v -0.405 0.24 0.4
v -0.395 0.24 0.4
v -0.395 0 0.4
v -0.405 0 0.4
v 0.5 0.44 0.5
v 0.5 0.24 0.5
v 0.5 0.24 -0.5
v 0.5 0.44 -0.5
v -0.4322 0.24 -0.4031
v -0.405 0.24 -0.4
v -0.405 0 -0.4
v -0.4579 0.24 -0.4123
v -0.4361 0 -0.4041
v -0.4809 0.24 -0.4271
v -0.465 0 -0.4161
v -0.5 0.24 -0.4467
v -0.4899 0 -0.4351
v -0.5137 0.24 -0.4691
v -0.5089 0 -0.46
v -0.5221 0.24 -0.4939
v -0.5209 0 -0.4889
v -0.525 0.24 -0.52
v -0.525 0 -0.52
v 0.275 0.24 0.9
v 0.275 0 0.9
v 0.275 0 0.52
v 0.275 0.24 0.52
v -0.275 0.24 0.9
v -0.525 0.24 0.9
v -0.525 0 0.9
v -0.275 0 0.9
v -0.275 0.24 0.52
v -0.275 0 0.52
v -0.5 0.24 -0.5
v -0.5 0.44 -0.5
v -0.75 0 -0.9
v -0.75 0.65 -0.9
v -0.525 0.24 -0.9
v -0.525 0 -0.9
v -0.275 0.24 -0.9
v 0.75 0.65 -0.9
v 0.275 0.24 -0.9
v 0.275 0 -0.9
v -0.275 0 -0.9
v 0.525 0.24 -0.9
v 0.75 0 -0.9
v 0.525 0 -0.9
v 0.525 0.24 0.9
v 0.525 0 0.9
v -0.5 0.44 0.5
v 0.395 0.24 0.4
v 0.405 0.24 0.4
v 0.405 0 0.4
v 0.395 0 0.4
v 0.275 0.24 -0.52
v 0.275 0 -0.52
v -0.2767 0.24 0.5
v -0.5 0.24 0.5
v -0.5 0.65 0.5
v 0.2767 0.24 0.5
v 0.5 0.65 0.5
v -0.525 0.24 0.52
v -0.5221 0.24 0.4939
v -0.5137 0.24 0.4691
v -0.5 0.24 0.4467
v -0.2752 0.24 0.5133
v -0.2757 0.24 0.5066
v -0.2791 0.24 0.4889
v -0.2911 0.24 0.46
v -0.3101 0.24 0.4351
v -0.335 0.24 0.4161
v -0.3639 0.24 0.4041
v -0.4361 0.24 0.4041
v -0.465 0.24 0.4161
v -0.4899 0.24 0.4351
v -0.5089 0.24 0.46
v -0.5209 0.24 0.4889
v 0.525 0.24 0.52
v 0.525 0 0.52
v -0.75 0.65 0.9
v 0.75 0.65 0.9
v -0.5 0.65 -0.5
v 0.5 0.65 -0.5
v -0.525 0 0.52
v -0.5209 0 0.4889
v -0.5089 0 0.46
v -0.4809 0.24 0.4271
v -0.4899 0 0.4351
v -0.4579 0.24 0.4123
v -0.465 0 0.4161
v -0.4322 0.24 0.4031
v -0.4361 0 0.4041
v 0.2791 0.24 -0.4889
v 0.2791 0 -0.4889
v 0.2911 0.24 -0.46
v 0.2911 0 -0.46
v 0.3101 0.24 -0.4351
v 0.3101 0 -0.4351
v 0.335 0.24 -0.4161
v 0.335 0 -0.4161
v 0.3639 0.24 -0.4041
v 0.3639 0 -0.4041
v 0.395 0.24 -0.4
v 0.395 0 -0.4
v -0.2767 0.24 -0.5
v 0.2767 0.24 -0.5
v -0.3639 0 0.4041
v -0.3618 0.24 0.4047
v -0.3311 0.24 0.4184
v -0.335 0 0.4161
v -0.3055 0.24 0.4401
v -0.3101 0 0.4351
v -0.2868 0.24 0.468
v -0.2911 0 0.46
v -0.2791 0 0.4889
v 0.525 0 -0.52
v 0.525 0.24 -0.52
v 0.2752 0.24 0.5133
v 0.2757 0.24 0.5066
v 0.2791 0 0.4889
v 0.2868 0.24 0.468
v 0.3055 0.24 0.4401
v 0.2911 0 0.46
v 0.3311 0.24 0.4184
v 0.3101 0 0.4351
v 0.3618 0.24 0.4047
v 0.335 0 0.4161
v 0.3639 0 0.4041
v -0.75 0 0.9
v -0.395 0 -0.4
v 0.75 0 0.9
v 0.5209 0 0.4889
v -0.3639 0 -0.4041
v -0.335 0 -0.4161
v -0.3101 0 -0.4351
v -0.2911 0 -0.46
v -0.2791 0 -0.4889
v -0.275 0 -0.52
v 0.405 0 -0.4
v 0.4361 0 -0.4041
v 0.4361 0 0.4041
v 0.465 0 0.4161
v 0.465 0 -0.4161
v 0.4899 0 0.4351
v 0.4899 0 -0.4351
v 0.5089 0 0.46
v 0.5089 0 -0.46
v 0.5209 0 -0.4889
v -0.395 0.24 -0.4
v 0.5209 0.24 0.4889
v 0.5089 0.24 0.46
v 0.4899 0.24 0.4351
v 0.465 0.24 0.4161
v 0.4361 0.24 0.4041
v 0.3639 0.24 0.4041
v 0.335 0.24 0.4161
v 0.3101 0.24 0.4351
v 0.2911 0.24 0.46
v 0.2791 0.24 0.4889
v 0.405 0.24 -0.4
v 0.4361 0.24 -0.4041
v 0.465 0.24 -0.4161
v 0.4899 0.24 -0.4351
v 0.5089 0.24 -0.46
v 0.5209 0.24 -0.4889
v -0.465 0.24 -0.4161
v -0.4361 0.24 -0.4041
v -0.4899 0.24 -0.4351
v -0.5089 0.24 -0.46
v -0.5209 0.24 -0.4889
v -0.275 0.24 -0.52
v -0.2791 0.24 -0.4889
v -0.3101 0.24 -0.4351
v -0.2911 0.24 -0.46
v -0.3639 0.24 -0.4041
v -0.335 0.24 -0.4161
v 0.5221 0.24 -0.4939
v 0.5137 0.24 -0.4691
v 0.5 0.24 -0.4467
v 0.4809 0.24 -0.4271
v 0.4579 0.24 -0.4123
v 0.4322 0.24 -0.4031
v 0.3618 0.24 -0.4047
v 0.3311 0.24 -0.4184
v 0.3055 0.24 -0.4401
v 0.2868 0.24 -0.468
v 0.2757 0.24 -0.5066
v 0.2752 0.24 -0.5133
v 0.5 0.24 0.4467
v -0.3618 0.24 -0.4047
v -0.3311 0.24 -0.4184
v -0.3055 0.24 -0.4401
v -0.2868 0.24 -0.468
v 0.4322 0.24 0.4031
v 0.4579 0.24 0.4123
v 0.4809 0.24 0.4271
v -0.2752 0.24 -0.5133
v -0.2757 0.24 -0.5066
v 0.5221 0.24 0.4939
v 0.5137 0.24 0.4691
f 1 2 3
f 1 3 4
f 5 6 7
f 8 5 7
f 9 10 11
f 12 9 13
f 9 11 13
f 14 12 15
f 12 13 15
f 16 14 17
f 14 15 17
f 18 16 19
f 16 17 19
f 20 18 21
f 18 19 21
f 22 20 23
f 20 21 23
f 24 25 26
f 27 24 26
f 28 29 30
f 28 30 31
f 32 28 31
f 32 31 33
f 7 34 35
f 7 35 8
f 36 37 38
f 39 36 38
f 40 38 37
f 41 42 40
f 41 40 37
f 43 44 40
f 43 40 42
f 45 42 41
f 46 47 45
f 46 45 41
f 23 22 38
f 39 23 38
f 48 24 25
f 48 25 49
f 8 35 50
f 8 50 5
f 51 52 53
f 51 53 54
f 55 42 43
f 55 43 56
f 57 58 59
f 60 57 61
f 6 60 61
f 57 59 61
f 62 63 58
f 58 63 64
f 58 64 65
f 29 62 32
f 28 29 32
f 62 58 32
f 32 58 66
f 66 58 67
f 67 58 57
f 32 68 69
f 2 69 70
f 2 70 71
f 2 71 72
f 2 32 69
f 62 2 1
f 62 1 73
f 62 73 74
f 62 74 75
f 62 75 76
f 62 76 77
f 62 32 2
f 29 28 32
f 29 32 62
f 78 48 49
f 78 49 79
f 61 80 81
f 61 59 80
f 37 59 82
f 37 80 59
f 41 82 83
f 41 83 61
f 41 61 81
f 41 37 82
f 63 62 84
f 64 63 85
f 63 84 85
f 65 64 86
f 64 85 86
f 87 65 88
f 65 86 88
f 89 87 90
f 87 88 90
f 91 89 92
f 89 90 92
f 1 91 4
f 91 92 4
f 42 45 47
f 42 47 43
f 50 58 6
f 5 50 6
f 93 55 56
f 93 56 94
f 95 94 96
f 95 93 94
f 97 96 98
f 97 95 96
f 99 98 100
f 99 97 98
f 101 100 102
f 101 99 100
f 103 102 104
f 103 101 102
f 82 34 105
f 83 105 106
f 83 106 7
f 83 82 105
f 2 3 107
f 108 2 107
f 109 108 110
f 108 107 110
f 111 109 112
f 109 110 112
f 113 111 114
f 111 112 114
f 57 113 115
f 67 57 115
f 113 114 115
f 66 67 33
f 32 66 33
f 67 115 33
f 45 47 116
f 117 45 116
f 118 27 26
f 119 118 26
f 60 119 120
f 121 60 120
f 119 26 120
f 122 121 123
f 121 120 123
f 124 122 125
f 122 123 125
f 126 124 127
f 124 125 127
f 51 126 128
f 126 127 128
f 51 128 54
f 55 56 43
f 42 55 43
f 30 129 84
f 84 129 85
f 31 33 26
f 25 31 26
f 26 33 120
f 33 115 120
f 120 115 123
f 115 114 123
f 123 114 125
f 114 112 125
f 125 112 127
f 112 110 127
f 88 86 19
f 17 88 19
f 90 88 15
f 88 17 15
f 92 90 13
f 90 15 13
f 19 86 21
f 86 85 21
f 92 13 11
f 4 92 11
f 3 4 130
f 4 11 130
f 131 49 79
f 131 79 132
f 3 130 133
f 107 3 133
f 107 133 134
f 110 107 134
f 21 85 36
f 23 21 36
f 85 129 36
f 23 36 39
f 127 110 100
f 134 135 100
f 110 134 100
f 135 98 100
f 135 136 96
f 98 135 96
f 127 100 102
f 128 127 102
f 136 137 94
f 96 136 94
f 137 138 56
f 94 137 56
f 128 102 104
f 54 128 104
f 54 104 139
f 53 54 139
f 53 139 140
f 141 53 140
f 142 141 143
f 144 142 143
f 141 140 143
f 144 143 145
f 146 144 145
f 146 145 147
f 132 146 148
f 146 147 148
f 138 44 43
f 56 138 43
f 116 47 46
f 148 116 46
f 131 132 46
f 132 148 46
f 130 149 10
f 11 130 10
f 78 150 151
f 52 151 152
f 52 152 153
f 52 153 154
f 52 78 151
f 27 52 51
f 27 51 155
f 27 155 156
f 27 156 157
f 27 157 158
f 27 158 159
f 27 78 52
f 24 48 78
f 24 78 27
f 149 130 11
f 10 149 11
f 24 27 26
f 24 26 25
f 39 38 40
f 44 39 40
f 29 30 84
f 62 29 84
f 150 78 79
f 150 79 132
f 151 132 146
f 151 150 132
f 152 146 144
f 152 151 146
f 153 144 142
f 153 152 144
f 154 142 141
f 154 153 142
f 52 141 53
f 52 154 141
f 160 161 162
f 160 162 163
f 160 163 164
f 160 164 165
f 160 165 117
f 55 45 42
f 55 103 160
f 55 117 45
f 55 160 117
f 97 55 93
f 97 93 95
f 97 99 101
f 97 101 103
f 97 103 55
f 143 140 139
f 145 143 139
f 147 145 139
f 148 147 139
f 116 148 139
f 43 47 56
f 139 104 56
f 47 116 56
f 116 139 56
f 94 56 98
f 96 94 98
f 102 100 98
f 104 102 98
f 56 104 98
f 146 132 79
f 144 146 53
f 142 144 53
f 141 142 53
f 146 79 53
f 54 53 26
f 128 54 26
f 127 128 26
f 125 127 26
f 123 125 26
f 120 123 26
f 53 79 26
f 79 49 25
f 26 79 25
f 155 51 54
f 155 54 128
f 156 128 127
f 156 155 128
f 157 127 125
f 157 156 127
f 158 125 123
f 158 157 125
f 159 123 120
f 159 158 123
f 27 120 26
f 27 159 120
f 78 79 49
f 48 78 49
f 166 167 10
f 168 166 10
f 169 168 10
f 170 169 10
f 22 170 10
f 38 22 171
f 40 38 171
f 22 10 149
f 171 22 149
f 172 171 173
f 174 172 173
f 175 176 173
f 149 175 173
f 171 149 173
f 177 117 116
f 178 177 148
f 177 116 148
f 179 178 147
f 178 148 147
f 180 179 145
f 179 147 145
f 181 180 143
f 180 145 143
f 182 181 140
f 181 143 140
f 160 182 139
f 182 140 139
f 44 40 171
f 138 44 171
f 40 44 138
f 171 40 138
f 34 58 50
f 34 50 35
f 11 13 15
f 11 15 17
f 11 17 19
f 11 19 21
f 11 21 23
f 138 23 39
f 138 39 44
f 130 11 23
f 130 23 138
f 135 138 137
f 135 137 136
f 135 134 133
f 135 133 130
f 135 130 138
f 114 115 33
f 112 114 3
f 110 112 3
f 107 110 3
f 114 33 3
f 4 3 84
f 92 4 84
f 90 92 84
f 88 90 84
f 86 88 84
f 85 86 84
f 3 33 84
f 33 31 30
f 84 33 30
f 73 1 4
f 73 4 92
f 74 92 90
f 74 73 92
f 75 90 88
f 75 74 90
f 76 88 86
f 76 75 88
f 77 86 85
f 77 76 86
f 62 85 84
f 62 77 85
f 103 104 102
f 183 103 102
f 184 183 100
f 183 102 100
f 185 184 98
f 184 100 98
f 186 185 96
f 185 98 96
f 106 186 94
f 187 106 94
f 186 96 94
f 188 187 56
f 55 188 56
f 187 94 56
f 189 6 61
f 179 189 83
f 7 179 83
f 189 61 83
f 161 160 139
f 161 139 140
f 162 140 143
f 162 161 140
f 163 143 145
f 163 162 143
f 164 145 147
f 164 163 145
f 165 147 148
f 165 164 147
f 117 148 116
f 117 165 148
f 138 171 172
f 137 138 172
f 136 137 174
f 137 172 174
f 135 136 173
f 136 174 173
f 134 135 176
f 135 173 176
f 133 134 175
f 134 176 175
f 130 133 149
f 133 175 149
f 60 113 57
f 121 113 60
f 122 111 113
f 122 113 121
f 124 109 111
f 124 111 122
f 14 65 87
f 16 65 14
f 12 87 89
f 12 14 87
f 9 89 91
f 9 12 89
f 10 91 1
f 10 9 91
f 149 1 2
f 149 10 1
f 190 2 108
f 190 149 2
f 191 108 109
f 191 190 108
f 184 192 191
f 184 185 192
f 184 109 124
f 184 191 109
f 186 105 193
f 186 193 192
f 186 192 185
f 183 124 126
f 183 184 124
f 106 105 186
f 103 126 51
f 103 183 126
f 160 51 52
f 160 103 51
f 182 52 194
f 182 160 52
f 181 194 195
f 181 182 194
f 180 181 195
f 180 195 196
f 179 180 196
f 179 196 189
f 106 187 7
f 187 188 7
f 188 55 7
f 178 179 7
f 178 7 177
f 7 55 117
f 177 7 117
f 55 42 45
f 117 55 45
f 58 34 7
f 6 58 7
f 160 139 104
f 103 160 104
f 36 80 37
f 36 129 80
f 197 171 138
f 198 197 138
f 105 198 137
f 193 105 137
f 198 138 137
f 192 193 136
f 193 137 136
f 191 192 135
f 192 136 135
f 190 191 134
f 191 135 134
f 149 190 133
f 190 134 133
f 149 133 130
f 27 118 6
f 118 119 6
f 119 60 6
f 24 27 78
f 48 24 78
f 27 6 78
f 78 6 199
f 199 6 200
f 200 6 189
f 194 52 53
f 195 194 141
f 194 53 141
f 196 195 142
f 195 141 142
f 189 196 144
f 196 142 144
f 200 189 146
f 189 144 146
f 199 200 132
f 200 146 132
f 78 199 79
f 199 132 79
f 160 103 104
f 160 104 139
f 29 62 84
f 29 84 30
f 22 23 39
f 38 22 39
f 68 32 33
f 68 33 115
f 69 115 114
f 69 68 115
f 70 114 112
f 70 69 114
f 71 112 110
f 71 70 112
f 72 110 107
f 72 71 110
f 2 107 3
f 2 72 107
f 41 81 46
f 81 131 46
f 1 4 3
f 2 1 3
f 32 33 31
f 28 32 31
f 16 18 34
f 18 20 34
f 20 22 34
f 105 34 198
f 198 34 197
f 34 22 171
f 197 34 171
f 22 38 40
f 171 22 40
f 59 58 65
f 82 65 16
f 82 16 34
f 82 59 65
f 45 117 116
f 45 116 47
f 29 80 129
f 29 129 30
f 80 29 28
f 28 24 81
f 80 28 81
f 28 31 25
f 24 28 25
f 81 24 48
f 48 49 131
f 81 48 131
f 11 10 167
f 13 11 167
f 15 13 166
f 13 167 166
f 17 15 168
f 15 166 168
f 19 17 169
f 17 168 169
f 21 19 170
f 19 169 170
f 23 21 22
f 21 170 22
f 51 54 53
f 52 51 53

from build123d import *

# Parameters (mm, degrees)
BOSS_EXTRUDE1_DEPTH   = 0.24
SKETCH2_W             = 1
SKETCH2_H             = 1
BOSS_EXTRUDE2_DEPTH   = 0.2
SKETCH3_W             = 1.5
SKETCH3_H             = 1.8
SKETCH3_W_2           = 1
SKETCH3_H_2           = 1
BOSS_EXTRUDE3_DEPTH   = 0.2
SKETCH4_W             = 1.5
SKETCH4_H             = 1.8
BOSS_EXTRUDE4_DEPTH   = 0.21
BOSS_EXTRUDE5_DEPTH   = 0.24
BOSS_EXTRUDE5_2_DEPTH = 0.24
BOSS_EXTRUDE5_3_DEPTH = 0.24
BOSS_EXTRUDE5_4_DEPTH = 0.24
SKETCH6_W             = 1
SKETCH6_H             = 1
CUT_EXTRUDE4_DEPTH    = 0.21


with BuildPart() as part:
    # Sketch1 → Boss-Extrude1 (new body)
    with BuildSketch(Plane(origin=(0, 0, 0), x_dir=(1, 0, 0), z_dir=(0, 1, 0))):
        with BuildLine():
            Line((0.75, 0.9), (0.525, 0.9))
            Line((0.525, 0.9), (0.525, 0.52))
            ThreePointArc((0.525, 0.52), (0.489852814, 0.435147186), (0.405, 0.4))
            Line((0.405, 0.4), (0.395, 0.4))
            ThreePointArc((0.395, 0.4), (0.310147186, 0.435147186), (0.275, 0.52))
            Line((0.275, 0.52), (0.275, 0.9))
            Line((0.275, 0.9), (-0.275, 0.9))
            Line((-0.275, 0.9), (-0.275, 0.52))
            ThreePointArc((-0.275, 0.52), (-0.310147186, 0.435147186), (-0.395, 0.4))
            Line((-0.395, 0.4), (-0.405, 0.4))
            ThreePointArc((-0.405, 0.4), (-0.489852814, 0.435147186), (-0.525, 0.52))
            Line((-0.525, 0.52), (-0.525, 0.9))
            Line((-0.525, 0.9), (-0.75, 0.9))
            Line((-0.75, 0.9), (-0.75, -0.9))
            Line((-0.75, -0.9), (-0.525, -0.9))
            Line((-0.525, -0.9), (-0.525, -0.52))
            ThreePointArc((-0.525, -0.52), (-0.489852814, -0.435147186), (-0.405, -0.4))
            Line((-0.405, -0.4), (-0.395, -0.4))
            ThreePointArc((-0.395, -0.4), (-0.310147186, -0.435147186), (-0.275, -0.52))
            Line((-0.275, -0.52), (-0.275, -0.9))
            Line((-0.275, -0.9), (0.275, -0.9))
            Line((0.275, -0.9), (0.275, -0.52))
            ThreePointArc((0.275, -0.52), (0.310147186, -0.435147186), (0.395, -0.4))
            Line((0.395, -0.4), (0.405, -0.4))
            ThreePointArc((0.405, -0.4), (0.489852814, -0.435147186), (0.525, -0.52))
            Line((0.525, -0.52), (0.525, -0.9))
            Line((0.525, -0.9), (0.75, -0.9))
            Line((0.75, -0.9), (0.75, 0.9))
        make_face()
    extrude(amount=BOSS_EXTRUDE1_DEPTH)

    # Sketch3 → Boss-Extrude3 (add)
    with BuildSketch(Plane(origin=(0, 0.24, 0), x_dir=(1, 0, 0), z_dir=(0, 1, 0))):
        Rectangle(SKETCH3_W, SKETCH3_H)
        Rectangle(SKETCH3_W_2, SKETCH3_H_2, mode=Mode.SUBTRACT)
    extrude(amount=BOSS_EXTRUDE3_DEPTH)

    # Sketch4 → Boss-Extrude4 (add)
    with BuildSketch(Plane(origin=(0, 0.44, 0), x_dir=(1, 0, 0), z_dir=(0, 1, 0))):
        Rectangle(SKETCH4_W, SKETCH4_H)
    extrude(amount=BOSS_EXTRUDE4_DEPTH)

    # Sketch6 → Cut-Extrude4 (cut)
    with BuildSketch(Plane(origin=(0, 0.65, 0), x_dir=(1, 0, 0), z_dir=(0, 1, 0))):
        Rectangle(SKETCH6_W, SKETCH6_H)
    extrude(amount=-CUT_EXTRUDE4_DEPTH, mode=Mode.SUBTRACT)


with BuildPart() as body_2:
    # Sketch2 → Boss-Extrude2 (new body)
    with BuildSketch(Plane(origin=(0, 0.24, 0), x_dir=(1, 0, 0), z_dir=(0, 1, 0))):
        Rectangle(SKETCH2_W, SKETCH2_H)
    extrude(amount=BOSS_EXTRUDE2_DEPTH)


with BuildPart() as body_3:
    # Sketch5 → Boss-Extrude5 (new body)
    with BuildSketch(Plane.XZ.offset(-0.24)):
        with BuildLine():
            Line((0.525, -0.9), (0.275, -0.9))
            Line((0.275, -0.9), (0.275, -0.52))
            ThreePointArc((0.275, -0.52), (0.310147186, -0.435147186), (0.395, -0.4))
            Line((0.395, -0.4), (0.405, -0.4))
            ThreePointArc((0.405, -0.4), (0.489852814, -0.435147186), (0.525, -0.52))
            Line((0.525, -0.52), (0.525, -0.9))
        make_face()
    extrude(amount=BOSS_EXTRUDE5_DEPTH)


with BuildPart() as body_4:
    # Sketch5 → Boss-Extrude5 2 (new body)
    with BuildSketch(Plane.XZ.offset(-0.24)):
        with BuildLine():
            Line((-0.395, -0.4), (-0.405, -0.4))
            ThreePointArc((-0.405, -0.4), (-0.489852814, -0.435147186), (-0.525, -0.52))
            Line((-0.525, -0.52), (-0.525, -0.9))
            Line((-0.525, -0.9), (-0.275, -0.9))
            Line((-0.275, -0.9), (-0.275, -0.52))
            ThreePointArc((-0.275, -0.52), (-0.310147186, -0.435147186), (-0.395, -0.4))
        make_face()
    extrude(amount=BOSS_EXTRUDE5_2_DEPTH)


with BuildPart() as body_5:
    # Sketch5 → Boss-Extrude5 3 (new body)
    with BuildSketch(Plane.XZ.offset(-0.24)):
        with BuildLine():
            Line((-0.525, 0.9), (-0.275, 0.9))
            Line((-0.275, 0.9), (-0.275, 0.52))
            ThreePointArc((-0.275, 0.52), (-0.310147186, 0.435147186), (-0.395, 0.4))
            Line((-0.395, 0.4), (-0.405, 0.4))
            ThreePointArc((-0.405, 0.4), (-0.489852814, 0.435147186), (-0.525, 0.52))
            Line((-0.525, 0.52), (-0.525, 0.9))
        make_face()
    extrude(amount=BOSS_EXTRUDE5_3_DEPTH)


with BuildPart() as body_6:
    # Sketch5 → Boss-Extrude5 4 (new body)
    with BuildSketch(Plane.XZ.offset(-0.24)):
        with BuildLine():
            Line((0.275, 0.9), (0.525, 0.9))
            Line((0.525, 0.9), (0.525, 0.52))
            ThreePointArc((0.525, 0.52), (0.489852814, 0.435147186), (0.405, 0.4))
            Line((0.405, 0.4), (0.395, 0.4))
            ThreePointArc((0.395, 0.4), (0.310147186, 0.435147186), (0.275, 0.52))
            Line((0.275, 0.52), (0.275, 0.9))
        make_face()
    extrude(amount=BOSS_EXTRUDE5_4_DEPTH)


solid = Compound([part.part, body_2.part, body_3.part, body_4.part, body_5.part, body_6.part])
